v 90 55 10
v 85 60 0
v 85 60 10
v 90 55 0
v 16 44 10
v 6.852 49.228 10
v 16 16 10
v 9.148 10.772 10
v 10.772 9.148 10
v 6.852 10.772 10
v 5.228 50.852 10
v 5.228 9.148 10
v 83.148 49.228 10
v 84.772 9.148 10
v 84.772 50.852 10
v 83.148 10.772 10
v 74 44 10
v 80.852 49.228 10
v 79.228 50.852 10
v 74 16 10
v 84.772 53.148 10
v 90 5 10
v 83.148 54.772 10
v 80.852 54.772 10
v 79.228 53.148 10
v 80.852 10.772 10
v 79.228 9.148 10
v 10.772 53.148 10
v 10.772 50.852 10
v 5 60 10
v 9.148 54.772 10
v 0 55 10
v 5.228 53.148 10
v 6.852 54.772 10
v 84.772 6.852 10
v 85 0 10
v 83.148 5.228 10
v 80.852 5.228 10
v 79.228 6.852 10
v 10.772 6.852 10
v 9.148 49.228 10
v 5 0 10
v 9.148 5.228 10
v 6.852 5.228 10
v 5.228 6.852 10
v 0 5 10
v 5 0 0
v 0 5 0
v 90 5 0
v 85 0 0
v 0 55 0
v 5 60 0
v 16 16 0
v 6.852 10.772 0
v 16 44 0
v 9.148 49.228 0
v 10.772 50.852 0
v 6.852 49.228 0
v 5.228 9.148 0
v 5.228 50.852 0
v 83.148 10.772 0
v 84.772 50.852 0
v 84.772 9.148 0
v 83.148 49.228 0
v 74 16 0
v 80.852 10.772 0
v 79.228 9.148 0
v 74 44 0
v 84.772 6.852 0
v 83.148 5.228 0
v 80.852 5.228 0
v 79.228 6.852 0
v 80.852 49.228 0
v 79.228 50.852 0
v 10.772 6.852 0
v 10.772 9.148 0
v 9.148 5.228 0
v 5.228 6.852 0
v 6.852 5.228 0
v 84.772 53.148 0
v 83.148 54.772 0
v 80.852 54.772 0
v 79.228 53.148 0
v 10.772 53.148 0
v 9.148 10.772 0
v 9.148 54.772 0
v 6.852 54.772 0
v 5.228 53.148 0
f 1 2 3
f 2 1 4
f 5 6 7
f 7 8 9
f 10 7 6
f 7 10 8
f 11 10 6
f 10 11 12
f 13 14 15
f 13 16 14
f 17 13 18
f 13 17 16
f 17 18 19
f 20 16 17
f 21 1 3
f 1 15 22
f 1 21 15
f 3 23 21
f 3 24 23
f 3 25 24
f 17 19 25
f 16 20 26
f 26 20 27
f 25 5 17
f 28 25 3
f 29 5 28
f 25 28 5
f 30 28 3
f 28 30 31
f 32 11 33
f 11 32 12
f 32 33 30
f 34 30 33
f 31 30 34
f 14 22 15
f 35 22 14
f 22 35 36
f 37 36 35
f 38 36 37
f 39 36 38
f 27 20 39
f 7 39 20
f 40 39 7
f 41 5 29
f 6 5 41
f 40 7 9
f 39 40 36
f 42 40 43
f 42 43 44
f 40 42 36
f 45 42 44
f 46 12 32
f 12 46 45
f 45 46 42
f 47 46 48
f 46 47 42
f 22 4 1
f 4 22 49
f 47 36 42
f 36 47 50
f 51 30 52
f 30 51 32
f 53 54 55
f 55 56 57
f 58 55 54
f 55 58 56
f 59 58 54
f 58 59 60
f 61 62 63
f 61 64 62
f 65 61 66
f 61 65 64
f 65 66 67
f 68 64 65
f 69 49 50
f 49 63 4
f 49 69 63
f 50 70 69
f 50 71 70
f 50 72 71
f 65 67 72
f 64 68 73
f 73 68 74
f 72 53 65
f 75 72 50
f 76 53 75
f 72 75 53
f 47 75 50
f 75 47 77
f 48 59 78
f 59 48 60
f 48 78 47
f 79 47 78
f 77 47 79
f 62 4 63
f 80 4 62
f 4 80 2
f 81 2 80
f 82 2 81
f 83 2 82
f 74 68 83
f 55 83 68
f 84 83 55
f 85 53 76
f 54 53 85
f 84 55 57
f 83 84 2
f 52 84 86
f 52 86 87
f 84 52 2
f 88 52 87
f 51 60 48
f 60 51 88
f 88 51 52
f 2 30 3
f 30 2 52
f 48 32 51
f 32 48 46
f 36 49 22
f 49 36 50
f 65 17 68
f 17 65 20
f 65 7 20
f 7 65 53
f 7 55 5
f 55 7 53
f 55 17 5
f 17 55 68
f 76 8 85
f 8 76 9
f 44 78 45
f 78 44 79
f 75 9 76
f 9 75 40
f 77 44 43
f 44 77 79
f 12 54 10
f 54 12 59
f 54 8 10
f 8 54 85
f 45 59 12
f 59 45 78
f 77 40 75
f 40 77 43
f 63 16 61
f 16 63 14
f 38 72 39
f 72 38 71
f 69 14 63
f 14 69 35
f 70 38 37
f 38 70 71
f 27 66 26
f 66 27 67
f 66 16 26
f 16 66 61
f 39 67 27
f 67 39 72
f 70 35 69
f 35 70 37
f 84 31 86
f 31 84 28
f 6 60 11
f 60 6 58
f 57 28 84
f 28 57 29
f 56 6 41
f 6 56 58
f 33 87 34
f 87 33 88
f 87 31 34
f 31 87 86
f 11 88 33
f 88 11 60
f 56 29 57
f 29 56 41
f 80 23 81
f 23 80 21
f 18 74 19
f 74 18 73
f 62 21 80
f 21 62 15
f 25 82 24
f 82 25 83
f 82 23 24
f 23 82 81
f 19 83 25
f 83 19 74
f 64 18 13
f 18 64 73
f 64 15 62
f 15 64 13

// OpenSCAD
$fn = 32;

// ----------------------------------------------------------------------
// Frame plate: 90 x 60 frame, 16 mm rails
// ----------------------------------------------------------------------

// --- parameters (mm) ---
plate_l = 90;             // plate length, X
plate_w = 60;             // plate width, Y
plate_t = 10;             // plate thickness, Z (extrusion height)
corner_c = 5;             // corner chamfer
frame_bar = 16;           // frame rail width
bolt_r = 3;               // corner bolt window radius
bolt_inset = 8;           // bolt centre inset from the edges

win_l = plate_l - 2 * frame_bar;  // window length
win_w = plate_w - 2 * frame_bar;  // window width
bolt_d = 2 * bolt_r;  // corner hole diameter

profile = [[5, 0], [85, 0], [90, 5], [90, 55], [85, 60], [5, 60], [0, 55], [0, 5]];  // primary outline, 8 points, counter clockwise
void_1 = [[16, 16], [74, 16], [74, 44], [16, 44]];  // the window, 4 points
void_2 = [[10.772, 9.148], [9.148, 10.772], [6.852, 10.772], [5.228, 9.148], [5.228, 6.852], [6.852, 5.228], [9.148, 5.228], [10.772, 6.852]];  // corner bolt window, 8 points
void_3 = [[84.772, 9.148], [83.148, 10.772], [80.852, 10.772], [79.228, 9.148], [79.228, 6.852], [80.852, 5.228], [83.148, 5.228], [84.772, 6.852]];  // corner bolt window, 8 points
void_4 = [[10.772, 53.148], [9.148, 54.772], [6.852, 54.772], [5.228, 53.148], [5.228, 50.852], [6.852, 49.228], [9.148, 49.228], [10.772, 50.852]];  // corner bolt window, 8 points
void_5 = [[84.772, 53.148], [83.148, 54.772], [80.852, 54.772], [79.228, 53.148], [79.228, 50.852], [80.852, 49.228], [83.148, 49.228], [84.772, 50.852]];  // corner bolt window, 8 points

// --- the one profile operation ---
difference() {
  linear_extrude(height = plate_t) polygon(points = profile);
  translate([0, 0, -1])
    linear_extrude(height = plate_t + 2) polygon(points = void_1);
  translate([0, 0, -1])
    linear_extrude(height = plate_t + 2) polygon(points = void_2);
  translate([0, 0, -1])
    linear_extrude(height = plate_t + 2) polygon(points = void_3);
  translate([0, 0, -1])
    linear_extrude(height = plate_t + 2) polygon(points = void_4);
  translate([0, 0, -1])
    linear_extrude(height = plate_t + 2) polygon(points = void_5);
}
